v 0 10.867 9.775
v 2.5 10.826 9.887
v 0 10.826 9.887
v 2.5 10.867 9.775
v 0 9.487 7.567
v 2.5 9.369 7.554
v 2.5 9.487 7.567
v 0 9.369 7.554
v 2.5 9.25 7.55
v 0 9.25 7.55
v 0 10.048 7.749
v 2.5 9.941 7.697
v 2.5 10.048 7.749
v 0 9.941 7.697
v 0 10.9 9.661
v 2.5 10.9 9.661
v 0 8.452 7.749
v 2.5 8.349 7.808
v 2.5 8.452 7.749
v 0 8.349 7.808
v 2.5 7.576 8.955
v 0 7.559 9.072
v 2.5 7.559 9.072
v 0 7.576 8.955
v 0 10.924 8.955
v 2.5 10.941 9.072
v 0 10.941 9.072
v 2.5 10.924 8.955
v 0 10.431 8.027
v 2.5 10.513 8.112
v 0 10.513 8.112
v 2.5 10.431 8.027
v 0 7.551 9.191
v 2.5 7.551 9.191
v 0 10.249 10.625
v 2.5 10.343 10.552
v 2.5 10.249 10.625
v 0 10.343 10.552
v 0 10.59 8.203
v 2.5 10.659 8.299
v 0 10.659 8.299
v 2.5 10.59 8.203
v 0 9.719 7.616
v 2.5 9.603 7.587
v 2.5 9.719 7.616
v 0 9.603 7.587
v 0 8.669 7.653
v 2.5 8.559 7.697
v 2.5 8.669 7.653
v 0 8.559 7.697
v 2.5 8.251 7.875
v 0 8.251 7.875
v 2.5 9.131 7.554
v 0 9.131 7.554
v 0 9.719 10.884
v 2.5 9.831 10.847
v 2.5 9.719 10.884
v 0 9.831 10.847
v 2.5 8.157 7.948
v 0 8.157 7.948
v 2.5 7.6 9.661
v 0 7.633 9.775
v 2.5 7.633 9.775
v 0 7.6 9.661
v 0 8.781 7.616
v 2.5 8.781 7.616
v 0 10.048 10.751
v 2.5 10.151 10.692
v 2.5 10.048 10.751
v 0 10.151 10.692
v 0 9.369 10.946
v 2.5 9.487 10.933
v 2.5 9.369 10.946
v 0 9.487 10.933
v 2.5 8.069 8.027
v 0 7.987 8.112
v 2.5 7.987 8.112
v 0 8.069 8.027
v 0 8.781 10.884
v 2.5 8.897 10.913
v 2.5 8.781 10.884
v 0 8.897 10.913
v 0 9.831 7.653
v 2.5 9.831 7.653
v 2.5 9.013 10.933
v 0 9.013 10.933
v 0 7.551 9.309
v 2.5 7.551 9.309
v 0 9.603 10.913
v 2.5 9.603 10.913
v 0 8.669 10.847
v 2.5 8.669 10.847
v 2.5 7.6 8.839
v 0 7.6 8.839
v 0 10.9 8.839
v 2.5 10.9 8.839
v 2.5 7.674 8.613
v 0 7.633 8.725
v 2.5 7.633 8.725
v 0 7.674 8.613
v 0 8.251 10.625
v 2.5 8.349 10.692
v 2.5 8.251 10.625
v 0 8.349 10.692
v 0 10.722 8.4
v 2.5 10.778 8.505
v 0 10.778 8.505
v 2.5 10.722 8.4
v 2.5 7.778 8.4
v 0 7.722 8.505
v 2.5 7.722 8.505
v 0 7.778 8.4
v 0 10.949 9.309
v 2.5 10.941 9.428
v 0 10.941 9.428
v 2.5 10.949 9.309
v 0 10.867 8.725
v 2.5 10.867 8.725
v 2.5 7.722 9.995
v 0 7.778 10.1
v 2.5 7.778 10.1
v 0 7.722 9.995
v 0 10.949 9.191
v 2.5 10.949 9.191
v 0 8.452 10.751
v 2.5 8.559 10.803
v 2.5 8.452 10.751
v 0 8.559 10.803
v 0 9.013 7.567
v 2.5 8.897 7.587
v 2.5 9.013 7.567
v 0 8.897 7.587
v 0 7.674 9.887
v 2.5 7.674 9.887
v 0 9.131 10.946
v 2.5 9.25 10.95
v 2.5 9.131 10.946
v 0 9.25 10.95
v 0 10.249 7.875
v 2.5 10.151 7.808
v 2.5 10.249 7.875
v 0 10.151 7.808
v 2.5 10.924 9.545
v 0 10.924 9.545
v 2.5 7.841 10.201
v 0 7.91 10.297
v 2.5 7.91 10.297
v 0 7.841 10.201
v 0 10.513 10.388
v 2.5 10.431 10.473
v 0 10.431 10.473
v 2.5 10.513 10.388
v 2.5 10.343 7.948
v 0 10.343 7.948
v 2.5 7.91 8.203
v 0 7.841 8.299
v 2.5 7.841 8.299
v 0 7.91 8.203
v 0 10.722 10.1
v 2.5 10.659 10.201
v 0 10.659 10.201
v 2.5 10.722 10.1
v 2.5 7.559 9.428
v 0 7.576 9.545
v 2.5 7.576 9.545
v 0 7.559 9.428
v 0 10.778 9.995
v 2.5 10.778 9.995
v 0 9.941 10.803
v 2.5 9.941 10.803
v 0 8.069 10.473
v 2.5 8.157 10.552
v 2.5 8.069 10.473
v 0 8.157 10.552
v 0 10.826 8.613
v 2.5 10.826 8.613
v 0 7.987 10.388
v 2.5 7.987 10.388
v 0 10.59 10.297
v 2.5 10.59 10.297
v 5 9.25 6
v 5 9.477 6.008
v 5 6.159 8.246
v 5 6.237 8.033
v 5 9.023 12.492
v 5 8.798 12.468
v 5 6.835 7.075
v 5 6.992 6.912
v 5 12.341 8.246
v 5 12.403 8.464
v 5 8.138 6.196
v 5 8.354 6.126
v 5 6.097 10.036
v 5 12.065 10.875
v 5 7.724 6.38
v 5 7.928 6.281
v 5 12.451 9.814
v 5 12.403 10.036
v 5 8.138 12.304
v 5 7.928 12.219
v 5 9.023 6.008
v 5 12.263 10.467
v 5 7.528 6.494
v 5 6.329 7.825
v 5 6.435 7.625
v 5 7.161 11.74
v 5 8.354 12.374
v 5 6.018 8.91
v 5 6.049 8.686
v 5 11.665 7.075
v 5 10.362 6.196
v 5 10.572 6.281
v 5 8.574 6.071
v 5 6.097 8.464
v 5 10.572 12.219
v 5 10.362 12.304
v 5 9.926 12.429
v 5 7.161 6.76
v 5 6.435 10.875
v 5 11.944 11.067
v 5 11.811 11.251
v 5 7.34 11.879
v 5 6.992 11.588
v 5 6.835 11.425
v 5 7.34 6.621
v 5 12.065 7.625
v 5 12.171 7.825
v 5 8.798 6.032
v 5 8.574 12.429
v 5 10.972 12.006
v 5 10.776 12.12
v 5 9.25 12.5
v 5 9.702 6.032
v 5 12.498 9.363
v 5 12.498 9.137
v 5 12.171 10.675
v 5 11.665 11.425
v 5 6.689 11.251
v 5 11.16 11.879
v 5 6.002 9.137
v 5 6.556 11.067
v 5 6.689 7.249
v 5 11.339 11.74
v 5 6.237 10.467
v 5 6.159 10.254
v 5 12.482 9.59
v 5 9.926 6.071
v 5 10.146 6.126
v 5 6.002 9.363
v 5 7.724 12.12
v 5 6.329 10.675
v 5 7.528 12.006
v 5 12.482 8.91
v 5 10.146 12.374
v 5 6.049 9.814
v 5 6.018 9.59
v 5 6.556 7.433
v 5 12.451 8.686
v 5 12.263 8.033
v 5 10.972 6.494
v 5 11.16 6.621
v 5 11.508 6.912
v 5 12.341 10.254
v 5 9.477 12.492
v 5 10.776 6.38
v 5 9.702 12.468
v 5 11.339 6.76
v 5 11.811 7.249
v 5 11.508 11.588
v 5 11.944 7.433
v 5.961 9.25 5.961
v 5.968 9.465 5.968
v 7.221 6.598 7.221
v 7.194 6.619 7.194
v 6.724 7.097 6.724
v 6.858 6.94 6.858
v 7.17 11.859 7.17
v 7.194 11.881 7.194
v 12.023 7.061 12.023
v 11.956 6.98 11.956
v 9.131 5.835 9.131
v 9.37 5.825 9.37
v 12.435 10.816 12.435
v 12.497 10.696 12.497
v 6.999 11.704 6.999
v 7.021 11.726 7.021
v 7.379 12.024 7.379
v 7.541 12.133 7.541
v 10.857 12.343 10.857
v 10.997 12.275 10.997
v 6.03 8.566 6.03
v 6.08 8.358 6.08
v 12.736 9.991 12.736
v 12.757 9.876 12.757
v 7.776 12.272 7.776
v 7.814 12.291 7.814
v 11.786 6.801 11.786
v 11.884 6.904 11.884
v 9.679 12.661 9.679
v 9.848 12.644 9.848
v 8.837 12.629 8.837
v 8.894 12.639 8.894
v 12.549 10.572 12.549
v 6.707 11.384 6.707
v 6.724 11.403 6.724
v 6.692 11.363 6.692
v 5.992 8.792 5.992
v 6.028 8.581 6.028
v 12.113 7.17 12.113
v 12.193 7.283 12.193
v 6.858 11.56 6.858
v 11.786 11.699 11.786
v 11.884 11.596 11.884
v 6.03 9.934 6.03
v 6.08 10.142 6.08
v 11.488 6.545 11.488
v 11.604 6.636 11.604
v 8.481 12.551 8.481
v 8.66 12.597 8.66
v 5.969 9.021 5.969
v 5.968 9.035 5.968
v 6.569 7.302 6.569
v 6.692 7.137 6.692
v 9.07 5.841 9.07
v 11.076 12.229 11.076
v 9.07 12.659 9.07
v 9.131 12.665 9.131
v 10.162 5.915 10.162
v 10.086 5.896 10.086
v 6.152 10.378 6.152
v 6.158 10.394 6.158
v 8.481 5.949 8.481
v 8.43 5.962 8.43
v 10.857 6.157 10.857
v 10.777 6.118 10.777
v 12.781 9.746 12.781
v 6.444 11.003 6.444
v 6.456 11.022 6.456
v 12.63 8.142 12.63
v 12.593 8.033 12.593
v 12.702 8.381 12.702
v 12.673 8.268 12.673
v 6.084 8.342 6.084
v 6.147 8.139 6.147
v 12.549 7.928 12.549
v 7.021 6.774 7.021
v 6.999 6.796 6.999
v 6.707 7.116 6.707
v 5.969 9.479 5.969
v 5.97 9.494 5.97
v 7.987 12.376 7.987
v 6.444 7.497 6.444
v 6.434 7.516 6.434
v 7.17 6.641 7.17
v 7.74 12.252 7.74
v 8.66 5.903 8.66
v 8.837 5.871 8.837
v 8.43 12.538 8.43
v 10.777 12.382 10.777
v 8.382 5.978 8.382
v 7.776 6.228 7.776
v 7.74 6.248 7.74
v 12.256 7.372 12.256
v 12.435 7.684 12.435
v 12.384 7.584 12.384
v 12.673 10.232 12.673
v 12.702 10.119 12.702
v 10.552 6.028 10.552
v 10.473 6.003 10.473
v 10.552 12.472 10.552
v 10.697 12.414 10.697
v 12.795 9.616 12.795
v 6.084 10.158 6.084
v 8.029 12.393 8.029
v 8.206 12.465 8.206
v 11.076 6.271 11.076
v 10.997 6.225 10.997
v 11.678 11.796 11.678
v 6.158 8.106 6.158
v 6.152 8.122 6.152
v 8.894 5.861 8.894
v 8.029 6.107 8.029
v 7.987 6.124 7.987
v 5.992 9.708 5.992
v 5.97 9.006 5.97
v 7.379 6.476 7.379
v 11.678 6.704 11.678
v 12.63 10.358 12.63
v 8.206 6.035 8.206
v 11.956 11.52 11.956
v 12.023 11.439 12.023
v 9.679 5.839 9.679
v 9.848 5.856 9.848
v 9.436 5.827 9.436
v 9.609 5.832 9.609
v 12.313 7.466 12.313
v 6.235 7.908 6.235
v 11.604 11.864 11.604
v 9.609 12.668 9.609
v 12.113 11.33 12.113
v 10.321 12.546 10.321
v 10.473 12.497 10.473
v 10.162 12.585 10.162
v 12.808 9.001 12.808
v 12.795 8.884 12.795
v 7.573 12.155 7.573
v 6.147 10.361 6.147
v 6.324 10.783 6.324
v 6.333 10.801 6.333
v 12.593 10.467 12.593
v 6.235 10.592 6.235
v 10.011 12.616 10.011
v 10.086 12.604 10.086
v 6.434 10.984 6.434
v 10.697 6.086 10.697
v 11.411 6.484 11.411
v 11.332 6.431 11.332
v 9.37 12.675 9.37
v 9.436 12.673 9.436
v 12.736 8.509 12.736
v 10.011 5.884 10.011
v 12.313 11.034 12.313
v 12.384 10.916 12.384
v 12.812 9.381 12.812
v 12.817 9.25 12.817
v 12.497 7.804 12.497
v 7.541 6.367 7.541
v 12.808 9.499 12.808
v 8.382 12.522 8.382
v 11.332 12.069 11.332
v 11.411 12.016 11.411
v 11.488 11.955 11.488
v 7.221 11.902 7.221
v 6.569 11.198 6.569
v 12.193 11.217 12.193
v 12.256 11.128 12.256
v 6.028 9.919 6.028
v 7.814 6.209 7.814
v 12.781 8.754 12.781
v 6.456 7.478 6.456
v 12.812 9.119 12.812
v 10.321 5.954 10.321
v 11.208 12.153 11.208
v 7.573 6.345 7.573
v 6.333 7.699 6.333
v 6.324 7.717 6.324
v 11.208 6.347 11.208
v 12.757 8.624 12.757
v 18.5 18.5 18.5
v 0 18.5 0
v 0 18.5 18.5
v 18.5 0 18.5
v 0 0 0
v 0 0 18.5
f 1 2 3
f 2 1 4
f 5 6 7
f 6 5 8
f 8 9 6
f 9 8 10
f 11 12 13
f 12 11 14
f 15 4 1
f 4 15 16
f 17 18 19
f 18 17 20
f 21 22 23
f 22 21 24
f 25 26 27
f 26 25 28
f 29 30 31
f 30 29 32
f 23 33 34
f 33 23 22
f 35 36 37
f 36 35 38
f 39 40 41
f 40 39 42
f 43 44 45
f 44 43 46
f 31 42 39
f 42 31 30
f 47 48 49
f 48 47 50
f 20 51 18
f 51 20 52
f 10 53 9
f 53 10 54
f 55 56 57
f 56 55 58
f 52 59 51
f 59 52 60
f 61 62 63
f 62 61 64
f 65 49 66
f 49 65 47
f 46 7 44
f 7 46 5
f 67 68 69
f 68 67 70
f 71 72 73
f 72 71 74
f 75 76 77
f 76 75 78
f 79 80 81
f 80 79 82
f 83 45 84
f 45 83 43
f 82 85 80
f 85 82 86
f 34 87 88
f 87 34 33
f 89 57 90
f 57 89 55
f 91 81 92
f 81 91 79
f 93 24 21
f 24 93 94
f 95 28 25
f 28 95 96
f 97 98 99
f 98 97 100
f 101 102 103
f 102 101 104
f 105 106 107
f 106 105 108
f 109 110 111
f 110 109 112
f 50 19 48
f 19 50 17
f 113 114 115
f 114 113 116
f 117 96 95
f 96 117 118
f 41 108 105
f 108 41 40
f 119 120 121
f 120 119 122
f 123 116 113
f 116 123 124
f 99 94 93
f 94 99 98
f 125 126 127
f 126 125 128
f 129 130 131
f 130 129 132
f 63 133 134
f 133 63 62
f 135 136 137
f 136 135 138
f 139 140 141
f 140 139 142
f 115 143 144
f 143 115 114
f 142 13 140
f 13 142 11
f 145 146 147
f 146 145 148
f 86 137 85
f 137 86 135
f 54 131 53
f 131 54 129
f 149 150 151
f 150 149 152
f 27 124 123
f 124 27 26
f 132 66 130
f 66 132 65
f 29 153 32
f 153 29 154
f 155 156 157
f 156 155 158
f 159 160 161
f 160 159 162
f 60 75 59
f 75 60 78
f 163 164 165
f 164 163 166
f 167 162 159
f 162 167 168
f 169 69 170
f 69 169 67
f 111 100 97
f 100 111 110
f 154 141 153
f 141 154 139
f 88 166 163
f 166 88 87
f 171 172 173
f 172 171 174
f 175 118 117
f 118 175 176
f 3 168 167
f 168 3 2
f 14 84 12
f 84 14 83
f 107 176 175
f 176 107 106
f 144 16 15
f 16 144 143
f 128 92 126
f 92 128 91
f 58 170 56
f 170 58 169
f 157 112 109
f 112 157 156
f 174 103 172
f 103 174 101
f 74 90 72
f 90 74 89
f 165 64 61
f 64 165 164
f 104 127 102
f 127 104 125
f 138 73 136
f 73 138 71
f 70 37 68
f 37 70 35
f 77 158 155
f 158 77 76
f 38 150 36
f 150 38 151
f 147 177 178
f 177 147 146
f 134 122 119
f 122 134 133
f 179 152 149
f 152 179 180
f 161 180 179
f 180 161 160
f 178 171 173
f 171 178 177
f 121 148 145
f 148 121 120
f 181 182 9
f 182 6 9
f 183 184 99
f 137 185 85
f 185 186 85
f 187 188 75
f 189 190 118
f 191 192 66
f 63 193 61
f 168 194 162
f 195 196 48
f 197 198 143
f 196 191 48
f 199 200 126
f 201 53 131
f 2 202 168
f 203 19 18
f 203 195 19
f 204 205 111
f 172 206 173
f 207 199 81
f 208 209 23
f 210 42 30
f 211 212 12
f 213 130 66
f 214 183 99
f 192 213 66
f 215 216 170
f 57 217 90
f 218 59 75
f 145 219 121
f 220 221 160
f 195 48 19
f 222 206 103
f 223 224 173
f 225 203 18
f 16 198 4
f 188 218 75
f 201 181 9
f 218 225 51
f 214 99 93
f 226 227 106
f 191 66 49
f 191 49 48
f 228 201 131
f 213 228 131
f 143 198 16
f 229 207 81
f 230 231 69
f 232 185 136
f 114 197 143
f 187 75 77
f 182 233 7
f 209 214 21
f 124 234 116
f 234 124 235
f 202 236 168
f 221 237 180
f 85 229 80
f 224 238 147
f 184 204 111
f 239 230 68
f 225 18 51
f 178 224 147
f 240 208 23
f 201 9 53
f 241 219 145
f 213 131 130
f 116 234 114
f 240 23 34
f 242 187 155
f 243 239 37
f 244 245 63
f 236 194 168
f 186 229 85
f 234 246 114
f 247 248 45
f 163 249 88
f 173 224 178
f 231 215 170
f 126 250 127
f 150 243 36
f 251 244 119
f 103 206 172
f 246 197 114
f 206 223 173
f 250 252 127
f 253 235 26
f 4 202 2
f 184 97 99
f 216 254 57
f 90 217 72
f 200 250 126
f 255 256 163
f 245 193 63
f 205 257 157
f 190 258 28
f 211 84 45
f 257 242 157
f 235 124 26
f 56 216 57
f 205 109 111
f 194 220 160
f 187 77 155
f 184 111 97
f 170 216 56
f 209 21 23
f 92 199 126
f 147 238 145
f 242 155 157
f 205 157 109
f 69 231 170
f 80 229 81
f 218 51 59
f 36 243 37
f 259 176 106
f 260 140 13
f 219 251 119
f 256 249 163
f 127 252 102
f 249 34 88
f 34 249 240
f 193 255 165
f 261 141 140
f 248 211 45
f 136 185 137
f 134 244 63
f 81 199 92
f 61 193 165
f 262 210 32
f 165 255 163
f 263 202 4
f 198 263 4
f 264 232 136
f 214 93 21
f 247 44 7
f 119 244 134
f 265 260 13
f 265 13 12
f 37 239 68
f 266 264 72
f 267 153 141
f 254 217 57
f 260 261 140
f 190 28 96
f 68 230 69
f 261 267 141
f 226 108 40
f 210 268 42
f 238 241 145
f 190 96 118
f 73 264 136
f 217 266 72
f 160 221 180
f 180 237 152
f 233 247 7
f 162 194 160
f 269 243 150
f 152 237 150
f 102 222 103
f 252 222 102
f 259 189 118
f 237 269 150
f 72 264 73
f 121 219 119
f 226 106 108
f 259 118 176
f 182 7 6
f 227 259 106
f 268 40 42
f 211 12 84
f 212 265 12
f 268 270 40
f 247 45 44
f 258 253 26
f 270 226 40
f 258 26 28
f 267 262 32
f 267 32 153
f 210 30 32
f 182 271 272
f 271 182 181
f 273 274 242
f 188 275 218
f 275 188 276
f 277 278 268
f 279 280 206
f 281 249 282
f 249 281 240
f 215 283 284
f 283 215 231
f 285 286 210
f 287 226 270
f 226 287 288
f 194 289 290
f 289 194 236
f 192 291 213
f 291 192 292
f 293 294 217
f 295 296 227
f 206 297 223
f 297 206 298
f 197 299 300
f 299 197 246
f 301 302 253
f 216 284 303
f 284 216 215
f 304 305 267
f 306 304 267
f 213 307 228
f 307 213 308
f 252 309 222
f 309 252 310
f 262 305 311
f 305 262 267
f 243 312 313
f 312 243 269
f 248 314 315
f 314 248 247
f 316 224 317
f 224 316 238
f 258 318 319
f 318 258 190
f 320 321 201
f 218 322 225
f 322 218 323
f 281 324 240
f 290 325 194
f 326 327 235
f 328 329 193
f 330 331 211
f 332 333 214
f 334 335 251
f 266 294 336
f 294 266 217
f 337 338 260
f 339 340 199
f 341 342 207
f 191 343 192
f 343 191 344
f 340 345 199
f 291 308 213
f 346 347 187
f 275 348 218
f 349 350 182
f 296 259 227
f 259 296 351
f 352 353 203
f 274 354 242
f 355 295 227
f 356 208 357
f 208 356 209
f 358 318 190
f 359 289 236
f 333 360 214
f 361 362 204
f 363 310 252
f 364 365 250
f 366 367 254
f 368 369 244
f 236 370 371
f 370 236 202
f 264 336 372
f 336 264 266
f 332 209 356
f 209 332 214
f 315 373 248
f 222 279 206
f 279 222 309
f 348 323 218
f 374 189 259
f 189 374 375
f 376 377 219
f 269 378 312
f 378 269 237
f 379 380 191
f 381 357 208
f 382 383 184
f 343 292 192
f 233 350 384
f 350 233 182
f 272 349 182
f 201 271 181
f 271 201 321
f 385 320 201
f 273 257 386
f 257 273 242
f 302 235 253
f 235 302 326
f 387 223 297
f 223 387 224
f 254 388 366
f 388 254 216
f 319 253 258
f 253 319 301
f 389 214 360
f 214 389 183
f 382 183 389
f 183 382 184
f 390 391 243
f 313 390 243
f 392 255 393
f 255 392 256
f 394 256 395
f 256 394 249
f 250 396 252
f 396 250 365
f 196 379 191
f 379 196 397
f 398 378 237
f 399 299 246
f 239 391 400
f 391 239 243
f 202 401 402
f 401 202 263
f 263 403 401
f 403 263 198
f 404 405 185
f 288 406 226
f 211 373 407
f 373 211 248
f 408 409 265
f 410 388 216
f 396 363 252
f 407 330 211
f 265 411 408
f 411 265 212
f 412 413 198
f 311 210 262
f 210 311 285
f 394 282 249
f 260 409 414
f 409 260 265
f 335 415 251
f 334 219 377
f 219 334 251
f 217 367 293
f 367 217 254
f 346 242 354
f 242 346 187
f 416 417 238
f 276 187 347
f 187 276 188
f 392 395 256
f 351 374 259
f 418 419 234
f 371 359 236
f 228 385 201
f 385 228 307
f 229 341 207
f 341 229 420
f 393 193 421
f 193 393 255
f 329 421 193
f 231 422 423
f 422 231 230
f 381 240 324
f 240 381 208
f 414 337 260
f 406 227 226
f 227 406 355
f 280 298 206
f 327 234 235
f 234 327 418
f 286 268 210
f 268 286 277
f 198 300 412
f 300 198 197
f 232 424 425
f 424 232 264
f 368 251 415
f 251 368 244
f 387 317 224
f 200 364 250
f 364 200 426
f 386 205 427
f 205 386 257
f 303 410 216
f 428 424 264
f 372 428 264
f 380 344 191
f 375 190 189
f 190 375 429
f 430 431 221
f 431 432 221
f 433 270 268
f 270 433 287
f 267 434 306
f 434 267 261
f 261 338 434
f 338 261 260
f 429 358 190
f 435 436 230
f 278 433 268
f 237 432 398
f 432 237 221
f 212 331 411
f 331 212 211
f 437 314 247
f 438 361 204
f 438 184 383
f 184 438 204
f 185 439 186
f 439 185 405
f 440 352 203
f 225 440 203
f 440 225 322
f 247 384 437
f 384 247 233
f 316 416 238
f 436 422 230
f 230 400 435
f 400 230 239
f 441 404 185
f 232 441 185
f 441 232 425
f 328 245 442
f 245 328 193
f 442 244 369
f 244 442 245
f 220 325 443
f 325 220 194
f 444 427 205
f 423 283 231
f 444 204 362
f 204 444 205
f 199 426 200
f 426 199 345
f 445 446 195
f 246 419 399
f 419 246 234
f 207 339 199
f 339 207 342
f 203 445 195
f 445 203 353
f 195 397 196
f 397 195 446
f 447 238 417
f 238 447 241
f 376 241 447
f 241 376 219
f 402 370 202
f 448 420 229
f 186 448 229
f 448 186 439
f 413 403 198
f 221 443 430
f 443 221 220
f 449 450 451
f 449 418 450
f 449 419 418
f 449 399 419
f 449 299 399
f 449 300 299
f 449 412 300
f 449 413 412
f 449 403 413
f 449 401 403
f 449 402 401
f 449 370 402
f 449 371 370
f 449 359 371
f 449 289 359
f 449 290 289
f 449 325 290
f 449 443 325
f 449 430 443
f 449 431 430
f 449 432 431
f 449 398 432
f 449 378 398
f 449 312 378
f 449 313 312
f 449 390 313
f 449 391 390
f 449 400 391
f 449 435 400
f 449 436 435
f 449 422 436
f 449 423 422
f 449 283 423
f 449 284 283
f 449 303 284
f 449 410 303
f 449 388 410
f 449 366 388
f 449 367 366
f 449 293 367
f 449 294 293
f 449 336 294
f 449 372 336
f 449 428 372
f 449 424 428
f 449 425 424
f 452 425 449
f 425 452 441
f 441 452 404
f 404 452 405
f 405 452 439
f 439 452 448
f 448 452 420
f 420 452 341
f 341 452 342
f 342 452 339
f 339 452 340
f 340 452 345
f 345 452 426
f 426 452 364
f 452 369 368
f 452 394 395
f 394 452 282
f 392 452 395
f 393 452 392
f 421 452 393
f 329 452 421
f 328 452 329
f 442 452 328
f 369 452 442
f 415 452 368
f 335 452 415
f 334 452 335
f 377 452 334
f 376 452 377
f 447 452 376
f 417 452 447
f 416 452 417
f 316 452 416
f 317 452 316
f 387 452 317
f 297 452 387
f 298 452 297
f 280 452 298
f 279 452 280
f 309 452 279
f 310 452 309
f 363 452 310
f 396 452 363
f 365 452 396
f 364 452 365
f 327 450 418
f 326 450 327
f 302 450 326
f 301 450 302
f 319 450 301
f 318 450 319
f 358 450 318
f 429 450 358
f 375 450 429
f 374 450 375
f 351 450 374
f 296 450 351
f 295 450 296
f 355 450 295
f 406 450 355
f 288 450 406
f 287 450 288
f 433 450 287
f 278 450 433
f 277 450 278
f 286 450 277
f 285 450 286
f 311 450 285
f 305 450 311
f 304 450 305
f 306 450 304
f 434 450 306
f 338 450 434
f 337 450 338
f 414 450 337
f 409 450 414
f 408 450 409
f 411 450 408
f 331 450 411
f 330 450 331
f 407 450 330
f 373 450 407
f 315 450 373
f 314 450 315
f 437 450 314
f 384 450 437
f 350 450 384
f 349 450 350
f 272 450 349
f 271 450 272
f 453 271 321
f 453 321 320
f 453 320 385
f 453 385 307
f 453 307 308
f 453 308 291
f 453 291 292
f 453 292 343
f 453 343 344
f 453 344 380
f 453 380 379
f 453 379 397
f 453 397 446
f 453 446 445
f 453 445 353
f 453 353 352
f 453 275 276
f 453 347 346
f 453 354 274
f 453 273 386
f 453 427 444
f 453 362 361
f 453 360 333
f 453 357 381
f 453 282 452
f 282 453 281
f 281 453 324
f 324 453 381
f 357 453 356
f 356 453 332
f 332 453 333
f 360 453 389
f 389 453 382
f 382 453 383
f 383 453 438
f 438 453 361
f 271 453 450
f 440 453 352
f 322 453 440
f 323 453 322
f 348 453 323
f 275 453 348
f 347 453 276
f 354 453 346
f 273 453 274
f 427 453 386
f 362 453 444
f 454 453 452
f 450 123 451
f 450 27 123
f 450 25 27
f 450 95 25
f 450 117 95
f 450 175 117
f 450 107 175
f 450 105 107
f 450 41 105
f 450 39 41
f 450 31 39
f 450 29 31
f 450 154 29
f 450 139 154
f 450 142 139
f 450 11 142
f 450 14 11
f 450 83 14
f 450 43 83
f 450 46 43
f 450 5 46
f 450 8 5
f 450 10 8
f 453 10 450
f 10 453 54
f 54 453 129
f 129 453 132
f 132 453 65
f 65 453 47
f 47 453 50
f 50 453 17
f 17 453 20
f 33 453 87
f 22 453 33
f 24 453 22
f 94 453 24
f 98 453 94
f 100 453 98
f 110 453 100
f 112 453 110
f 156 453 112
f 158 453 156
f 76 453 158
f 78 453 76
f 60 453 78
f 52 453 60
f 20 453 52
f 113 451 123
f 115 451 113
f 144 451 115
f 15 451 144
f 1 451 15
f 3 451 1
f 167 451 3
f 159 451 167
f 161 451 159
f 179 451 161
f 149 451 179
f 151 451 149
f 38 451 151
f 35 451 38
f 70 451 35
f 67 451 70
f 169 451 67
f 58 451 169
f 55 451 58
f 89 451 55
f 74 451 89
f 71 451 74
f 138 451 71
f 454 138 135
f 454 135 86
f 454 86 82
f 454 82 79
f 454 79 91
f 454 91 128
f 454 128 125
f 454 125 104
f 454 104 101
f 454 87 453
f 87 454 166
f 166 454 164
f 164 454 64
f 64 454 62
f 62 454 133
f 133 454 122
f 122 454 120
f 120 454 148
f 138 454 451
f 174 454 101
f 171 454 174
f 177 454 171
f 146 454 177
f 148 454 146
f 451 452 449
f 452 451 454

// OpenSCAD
//Schreibtischeckhalter
$fn=90;
//Dicke Schreibtischplatte
d1=37;
//Dicke Brett
d2=18.5;
//Dicke Schreibtischplatte hinten ab Blech noch
d3=15;
//Dicke Blech
db=2.3;
//Durchmesser Schraube
ds=3.4;
//Kopfhöhe Schraube
khs=2.5;
//Durchmesser Schraubenkopf
dsk=6.5;
//Durchmesser Bit
dbit=8;


//Höhe Eckhalter
he=d1-d2;
//Breite Eckhalter
be=he; //wir nehmen mal die Höhe als Breite auch
te=he; //hier genauso

module eckhalter_basis()
{
translate([0,he,0])
rotate([90,0,0])
linear_extrude(he)
polygon([[0,0],[0,he],[he,he]]);
}

module schraube()
{
    rotate([0,90,0])
    {
    cylinder(h=he, d=ds);
    translate([0,0,he])
    cylinder(h=khs, d1=ds, d2=dsk);
    
    translate([0,0,he+khs])
    cylinder(h=he, d1=dsk, d2=dbit);
    }
}

difference()
{
eckhalter_basis();

translate([-he+khs,he/2,he/2])
schraube();
}
